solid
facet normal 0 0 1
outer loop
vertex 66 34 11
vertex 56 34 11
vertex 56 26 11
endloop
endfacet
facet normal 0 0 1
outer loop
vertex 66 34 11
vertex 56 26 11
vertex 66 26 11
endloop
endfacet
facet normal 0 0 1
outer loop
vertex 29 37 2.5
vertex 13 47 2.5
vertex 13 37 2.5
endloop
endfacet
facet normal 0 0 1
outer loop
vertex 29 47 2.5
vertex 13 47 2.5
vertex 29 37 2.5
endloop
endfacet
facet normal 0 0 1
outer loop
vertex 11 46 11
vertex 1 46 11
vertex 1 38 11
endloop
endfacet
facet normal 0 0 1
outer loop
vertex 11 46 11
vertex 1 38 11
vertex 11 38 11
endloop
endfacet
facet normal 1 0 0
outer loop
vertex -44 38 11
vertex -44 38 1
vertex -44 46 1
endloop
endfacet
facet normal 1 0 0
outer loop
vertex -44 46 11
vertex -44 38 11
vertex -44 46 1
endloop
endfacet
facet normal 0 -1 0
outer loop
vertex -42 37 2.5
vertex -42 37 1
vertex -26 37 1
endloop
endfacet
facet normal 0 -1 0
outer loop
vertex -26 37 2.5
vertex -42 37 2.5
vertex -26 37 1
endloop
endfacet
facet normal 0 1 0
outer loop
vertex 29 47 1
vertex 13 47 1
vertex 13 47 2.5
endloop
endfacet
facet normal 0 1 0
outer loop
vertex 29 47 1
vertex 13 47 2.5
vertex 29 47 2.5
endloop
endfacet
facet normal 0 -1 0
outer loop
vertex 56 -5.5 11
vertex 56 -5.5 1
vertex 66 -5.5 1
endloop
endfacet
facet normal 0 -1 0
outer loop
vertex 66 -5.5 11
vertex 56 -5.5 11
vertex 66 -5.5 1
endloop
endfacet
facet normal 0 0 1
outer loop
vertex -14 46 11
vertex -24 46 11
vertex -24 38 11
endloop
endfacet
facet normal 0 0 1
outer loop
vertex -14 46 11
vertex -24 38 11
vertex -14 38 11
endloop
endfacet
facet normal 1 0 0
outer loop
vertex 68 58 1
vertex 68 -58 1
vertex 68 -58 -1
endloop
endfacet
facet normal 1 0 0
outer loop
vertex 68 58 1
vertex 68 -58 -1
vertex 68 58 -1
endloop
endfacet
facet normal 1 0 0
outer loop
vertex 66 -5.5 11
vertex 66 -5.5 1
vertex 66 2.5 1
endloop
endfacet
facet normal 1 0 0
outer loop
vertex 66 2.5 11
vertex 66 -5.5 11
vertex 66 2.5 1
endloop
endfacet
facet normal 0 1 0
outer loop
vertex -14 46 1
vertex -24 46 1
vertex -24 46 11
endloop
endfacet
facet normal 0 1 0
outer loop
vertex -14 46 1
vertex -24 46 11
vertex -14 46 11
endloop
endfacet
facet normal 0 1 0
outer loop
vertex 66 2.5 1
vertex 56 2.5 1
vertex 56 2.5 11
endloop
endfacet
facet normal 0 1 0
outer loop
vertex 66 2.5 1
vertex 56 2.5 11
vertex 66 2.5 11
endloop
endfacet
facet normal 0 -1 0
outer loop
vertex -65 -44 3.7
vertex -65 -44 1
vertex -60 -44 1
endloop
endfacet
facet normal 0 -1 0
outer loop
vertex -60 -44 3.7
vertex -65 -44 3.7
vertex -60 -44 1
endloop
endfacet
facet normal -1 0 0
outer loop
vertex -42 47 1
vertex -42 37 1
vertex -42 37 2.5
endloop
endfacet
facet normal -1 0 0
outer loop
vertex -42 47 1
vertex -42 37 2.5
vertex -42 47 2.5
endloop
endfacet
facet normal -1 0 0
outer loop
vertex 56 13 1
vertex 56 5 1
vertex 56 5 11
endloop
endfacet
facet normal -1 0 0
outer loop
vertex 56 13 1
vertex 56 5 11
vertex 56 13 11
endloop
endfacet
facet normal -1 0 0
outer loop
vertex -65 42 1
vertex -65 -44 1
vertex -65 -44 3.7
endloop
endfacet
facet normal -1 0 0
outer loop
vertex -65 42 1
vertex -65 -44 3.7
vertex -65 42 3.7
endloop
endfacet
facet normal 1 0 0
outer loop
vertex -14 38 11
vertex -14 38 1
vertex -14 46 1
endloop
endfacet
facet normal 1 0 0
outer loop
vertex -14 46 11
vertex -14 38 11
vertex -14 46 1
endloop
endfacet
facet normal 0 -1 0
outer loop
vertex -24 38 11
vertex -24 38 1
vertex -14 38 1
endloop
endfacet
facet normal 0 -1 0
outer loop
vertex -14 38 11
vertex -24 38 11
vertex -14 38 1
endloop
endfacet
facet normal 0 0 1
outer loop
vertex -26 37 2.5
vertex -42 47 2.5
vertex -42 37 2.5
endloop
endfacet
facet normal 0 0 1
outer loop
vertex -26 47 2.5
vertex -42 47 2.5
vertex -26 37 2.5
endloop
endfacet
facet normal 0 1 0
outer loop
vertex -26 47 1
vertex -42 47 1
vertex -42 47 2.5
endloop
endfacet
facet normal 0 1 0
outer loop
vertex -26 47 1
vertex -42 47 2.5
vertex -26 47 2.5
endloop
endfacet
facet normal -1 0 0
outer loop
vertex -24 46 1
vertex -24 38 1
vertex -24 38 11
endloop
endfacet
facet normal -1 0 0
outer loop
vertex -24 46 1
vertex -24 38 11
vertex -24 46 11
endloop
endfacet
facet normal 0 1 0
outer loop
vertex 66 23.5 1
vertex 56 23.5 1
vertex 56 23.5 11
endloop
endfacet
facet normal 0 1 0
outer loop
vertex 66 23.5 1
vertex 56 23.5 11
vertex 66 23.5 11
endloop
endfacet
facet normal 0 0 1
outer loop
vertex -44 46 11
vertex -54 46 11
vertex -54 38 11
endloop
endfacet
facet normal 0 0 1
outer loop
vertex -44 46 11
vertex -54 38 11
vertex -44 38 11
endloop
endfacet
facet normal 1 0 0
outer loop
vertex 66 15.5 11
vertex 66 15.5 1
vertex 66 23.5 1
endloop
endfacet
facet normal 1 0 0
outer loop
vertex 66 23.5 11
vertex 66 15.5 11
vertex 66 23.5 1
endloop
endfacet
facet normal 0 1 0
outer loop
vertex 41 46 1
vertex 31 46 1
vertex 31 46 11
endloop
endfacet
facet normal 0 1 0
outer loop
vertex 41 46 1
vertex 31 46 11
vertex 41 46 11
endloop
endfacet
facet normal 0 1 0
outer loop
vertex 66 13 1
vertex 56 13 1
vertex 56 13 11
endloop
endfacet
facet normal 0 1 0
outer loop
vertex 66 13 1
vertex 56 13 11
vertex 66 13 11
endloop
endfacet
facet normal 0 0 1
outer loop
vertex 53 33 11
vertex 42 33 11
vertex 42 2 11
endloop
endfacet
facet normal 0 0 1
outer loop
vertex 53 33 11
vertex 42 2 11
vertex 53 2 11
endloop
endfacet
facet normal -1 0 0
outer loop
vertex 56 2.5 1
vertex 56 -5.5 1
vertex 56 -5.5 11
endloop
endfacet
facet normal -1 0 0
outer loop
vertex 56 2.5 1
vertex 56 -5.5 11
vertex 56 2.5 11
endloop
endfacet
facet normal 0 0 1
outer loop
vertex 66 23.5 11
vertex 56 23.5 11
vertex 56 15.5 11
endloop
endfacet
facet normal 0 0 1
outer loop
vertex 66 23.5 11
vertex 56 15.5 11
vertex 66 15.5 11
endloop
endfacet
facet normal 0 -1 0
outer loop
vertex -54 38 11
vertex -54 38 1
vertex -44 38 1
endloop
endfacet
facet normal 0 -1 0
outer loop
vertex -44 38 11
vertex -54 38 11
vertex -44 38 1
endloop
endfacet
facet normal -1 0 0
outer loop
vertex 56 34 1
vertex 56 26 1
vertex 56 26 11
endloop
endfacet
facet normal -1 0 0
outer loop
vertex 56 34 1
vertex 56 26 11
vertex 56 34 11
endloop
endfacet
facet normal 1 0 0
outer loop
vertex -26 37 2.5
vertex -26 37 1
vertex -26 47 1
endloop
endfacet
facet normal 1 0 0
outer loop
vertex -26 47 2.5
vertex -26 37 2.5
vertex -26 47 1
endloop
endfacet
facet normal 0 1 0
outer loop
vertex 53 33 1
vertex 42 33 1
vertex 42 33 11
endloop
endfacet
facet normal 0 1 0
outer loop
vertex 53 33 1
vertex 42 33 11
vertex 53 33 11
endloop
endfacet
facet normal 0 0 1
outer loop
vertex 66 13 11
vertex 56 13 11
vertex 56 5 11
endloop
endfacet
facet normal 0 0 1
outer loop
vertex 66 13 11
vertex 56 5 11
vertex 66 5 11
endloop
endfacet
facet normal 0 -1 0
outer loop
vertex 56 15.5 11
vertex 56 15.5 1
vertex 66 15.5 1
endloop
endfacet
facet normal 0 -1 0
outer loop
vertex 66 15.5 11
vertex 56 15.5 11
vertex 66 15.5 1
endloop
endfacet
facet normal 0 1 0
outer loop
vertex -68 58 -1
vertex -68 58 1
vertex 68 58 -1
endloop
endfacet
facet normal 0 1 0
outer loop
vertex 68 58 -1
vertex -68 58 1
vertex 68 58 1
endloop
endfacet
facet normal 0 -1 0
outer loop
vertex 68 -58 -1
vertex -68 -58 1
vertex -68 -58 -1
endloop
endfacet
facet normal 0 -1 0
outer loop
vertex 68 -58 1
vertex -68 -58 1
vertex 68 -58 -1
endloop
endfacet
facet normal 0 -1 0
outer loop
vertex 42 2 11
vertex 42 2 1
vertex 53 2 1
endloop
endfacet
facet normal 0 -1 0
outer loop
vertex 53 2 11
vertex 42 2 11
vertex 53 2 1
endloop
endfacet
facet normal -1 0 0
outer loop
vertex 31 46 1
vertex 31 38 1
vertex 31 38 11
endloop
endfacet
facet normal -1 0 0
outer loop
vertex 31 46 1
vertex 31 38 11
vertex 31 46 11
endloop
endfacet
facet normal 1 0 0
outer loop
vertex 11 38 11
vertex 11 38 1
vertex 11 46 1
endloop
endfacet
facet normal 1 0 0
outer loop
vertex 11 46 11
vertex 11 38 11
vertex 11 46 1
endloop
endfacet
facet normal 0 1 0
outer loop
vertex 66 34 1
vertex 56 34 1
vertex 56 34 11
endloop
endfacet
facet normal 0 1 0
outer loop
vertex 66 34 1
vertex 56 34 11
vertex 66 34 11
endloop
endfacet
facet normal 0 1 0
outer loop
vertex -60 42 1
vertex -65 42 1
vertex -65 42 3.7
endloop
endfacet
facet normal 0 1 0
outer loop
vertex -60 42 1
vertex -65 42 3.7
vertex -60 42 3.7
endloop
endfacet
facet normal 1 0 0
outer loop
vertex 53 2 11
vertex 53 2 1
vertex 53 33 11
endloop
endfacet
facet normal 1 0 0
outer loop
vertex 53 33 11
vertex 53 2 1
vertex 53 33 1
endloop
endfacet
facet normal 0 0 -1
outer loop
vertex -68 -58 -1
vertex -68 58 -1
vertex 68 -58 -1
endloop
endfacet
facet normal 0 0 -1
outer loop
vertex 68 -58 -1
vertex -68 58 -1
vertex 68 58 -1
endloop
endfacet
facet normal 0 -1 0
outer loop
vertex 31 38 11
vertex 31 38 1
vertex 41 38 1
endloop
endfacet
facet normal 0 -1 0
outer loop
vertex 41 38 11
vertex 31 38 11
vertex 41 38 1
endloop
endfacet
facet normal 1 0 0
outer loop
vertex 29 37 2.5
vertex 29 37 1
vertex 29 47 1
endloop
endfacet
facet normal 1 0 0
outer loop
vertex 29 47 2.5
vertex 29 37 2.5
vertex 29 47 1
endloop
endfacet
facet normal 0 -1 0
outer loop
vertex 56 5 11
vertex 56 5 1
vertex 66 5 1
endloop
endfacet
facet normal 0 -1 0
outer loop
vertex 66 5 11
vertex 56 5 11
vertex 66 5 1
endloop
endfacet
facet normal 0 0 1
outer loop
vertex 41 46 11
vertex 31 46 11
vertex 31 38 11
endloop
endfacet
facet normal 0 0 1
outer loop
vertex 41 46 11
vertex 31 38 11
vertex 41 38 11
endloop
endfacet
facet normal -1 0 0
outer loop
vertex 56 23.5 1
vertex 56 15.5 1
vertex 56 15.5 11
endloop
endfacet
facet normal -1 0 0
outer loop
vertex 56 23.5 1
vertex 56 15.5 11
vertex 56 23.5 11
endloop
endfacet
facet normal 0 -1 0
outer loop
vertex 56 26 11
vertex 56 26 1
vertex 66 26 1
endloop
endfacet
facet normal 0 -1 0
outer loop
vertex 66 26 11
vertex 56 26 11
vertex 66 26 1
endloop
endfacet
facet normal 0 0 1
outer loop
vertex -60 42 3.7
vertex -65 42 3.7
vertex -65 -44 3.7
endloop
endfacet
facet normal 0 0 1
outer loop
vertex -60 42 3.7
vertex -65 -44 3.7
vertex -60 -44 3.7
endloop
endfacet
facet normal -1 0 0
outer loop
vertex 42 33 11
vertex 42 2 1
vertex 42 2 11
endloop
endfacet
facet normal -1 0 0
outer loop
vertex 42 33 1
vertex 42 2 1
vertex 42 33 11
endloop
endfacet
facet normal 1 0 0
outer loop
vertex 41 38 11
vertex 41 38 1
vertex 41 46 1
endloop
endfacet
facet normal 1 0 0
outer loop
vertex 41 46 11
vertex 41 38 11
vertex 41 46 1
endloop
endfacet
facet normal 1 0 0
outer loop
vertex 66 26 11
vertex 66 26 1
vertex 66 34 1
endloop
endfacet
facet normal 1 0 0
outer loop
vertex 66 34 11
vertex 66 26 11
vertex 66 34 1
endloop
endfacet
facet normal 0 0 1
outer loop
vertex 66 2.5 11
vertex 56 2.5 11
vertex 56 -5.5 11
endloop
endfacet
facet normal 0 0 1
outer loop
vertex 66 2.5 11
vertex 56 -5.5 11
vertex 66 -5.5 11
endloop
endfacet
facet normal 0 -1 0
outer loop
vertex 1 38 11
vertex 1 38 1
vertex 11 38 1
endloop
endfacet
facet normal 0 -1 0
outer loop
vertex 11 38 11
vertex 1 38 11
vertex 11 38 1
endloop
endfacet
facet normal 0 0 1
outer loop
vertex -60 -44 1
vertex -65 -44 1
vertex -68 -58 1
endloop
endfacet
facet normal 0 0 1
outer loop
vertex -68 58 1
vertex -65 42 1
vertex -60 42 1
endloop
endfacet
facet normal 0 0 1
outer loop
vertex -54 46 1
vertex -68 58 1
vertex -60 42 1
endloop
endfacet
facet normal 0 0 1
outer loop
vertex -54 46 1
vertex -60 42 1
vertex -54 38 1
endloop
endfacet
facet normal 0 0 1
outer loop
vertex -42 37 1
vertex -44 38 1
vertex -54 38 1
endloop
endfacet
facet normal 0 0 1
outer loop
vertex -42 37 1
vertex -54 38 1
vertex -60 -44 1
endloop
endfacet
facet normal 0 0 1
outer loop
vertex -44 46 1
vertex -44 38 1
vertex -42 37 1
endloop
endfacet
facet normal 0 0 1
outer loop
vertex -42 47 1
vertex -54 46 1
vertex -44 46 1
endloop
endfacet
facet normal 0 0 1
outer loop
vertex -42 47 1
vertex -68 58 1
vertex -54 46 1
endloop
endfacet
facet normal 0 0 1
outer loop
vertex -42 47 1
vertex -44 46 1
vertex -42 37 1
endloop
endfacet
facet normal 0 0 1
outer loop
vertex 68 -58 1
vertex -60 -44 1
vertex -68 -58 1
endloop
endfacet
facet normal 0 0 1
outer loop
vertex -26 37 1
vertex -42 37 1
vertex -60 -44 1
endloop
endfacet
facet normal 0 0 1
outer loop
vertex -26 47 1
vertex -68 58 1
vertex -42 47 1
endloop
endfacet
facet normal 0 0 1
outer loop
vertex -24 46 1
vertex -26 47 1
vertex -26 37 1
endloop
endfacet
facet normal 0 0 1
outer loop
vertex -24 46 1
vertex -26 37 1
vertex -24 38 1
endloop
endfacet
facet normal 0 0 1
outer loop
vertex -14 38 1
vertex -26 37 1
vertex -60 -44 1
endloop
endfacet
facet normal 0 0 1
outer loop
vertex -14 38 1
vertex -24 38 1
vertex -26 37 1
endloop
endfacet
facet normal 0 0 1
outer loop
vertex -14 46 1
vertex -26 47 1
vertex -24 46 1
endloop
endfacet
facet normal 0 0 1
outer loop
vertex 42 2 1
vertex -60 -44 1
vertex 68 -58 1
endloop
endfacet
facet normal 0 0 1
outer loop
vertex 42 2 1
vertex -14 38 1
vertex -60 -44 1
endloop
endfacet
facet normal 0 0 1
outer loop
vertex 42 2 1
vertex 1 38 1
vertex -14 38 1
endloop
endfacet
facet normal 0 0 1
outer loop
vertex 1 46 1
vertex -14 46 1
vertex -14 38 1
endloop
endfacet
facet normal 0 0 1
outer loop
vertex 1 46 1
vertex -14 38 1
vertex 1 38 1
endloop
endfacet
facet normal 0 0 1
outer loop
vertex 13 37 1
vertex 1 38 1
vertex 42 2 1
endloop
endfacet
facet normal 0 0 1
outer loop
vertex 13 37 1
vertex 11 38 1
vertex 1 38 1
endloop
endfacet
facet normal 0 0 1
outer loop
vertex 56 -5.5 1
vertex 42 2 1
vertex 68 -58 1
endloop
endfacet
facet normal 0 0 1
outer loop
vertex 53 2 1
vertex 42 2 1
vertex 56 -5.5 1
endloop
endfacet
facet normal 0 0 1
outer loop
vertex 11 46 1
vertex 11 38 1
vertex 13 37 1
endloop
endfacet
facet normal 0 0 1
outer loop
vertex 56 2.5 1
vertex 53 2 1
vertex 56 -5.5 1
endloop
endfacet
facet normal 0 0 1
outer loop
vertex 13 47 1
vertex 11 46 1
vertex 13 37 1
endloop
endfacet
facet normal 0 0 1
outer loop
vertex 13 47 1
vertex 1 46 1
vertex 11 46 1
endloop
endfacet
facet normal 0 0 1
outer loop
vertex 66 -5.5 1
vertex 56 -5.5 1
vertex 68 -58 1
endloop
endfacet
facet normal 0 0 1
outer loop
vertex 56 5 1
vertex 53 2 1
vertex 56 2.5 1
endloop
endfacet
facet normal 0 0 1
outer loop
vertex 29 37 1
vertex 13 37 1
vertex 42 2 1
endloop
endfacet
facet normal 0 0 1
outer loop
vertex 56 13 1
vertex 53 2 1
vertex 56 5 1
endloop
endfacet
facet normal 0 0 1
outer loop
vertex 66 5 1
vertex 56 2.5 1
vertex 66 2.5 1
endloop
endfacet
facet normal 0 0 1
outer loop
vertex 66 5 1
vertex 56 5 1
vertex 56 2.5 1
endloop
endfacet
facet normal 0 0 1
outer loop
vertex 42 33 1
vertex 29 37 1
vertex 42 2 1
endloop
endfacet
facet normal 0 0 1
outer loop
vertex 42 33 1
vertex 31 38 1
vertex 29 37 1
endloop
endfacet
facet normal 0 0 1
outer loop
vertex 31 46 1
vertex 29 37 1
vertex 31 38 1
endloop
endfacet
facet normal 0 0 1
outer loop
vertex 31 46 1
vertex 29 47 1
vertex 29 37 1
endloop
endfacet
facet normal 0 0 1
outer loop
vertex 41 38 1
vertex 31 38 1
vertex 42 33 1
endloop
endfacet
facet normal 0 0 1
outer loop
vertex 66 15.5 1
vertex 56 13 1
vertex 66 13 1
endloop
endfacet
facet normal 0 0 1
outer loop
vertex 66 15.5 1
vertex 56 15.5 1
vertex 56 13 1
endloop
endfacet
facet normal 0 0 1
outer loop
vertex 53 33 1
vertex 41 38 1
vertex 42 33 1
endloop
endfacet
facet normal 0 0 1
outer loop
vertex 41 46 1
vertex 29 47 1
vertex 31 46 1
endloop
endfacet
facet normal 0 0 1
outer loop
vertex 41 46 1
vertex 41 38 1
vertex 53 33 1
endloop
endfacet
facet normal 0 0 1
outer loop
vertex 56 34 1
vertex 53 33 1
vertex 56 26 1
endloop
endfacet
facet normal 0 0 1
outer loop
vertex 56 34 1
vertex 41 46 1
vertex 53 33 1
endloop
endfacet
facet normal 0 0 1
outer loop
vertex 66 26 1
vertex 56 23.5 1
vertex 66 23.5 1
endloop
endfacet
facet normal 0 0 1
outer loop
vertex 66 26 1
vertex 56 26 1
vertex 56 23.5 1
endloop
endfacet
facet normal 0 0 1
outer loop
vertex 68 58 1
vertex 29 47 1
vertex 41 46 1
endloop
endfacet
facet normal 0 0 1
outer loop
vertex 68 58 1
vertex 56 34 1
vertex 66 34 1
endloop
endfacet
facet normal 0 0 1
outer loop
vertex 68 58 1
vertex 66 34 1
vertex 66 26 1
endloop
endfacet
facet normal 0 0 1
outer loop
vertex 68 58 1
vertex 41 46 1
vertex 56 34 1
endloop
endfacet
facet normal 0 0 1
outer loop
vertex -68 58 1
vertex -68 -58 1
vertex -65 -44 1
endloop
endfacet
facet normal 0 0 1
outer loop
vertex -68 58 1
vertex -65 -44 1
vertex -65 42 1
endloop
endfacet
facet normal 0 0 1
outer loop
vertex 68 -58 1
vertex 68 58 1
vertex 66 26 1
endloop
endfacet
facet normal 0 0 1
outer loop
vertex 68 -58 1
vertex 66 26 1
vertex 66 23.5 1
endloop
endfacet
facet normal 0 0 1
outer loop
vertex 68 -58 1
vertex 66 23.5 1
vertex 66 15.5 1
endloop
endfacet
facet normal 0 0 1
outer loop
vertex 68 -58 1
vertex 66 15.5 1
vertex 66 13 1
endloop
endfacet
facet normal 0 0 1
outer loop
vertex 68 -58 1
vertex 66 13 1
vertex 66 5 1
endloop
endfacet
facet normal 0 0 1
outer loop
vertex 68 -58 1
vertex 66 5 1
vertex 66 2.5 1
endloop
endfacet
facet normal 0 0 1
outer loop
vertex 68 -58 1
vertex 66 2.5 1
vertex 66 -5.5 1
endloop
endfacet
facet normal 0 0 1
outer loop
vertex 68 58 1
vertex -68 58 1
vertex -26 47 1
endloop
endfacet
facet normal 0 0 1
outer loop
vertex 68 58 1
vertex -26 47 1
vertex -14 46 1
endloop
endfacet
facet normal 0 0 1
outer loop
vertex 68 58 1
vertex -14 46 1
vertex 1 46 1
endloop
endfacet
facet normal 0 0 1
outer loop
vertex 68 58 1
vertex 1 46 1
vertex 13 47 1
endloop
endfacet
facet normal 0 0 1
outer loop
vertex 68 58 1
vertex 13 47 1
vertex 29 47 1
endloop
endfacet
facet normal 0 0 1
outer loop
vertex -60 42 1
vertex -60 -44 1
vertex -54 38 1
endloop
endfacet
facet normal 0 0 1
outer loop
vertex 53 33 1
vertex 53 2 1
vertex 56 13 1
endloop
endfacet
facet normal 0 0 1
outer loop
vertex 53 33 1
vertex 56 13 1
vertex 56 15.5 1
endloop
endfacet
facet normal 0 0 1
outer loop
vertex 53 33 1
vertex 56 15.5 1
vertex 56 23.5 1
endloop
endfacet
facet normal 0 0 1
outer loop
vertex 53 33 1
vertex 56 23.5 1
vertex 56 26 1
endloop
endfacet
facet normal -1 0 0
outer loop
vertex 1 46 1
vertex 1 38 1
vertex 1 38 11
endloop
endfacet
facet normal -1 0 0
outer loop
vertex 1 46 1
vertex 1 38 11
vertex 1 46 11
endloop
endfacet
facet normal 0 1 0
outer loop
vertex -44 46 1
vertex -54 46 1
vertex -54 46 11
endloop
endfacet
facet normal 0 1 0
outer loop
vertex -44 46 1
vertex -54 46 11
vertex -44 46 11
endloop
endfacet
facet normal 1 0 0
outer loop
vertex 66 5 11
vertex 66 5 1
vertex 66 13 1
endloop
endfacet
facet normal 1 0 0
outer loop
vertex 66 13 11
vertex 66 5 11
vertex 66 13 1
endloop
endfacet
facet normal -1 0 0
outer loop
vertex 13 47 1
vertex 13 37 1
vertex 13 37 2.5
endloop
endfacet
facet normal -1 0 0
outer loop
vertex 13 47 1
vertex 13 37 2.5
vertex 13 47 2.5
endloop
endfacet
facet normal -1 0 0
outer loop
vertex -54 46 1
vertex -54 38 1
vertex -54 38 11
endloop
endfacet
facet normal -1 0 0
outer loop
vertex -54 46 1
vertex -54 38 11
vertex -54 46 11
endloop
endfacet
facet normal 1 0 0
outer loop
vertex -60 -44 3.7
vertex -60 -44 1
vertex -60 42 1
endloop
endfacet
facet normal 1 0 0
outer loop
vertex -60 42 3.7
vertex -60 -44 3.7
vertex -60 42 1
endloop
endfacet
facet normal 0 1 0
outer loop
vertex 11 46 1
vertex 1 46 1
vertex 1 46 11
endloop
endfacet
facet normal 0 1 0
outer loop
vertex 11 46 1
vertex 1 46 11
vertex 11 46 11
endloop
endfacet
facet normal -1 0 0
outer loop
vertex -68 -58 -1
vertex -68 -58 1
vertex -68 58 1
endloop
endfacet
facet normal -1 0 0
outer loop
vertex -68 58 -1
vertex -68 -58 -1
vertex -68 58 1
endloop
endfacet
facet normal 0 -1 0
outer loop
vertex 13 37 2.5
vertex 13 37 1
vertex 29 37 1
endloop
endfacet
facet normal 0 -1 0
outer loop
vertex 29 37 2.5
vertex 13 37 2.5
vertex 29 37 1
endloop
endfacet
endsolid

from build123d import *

# Parameters (mm, degrees)
F0_W        = 136
F0_H        = 116
F1_DEPTH    = 1
F2_W        = 11
F2_H        = 31
F2_W_2      = 16
F2_H_2      = 10
F2_W_3      = 5
F2_H_3      = 86
F2_W_4      = 10
F2_H_4      = 8
F3_DEPTH    = 10
F3_FACE_W   = 5
F3_FACE_H   = 86
F4_DEPTH    = 7.3
F3_FACE_W_2 = 16
F3_FACE_H_2 = 10
F5_DEPTH    = 8.5


with BuildPart() as f1:
    # F0 (on Top) → F1 (new body, symmetric)
    with BuildSketch(Plane.XY):
        Rectangle(F0_W, F0_H)
    extrude(amount=F1_DEPTH, both=True)

    # F2 (on face) → F3 (join)
    with BuildSketch(Plane.XY.offset(1)):
        with Locations((47.5, 17.5)):
            Rectangle(F2_W, F2_H)
        with Locations((21, 42)):
            Rectangle(F2_W_2, F2_H_2)
        with Locations((-34, 42)):
            Rectangle(F2_W_2, F2_H_2)
        with Locations((-62.5, -1)):
            Rectangle(F2_W_3, F2_H_3)
        with Locations((-49, 42)):
            Rectangle(F2_W_4, F2_H_4)
        with Locations((-19, 42)):
            Rectangle(F2_W_4, F2_H_4)
        with Locations((6, 42)):
            Rectangle(F2_W_4, F2_H_4)
        with Locations((36, 42)):
            Rectangle(F2_W_4, F2_H_4)
        with Locations((61, 30)):
            Rectangle(F2_W_4, F2_H_4)
        with Locations((61, 19.5)):
            Rectangle(F2_W_4, F2_H_4)
        with Locations((61, 9)):
            Rectangle(F2_W_4, F2_H_4)
        with Locations((61, -1.5)):
            Rectangle(F2_W_4, F2_H_4)
    extrude(amount=F3_DEPTH)

    # F3_face (on face) → F4 (cut)
    with BuildSketch(Plane(origin=(-62.5, -1, 11), x_dir=(1, 0, 0), z_dir=(0, 0, 1))):
        Rectangle(F3_FACE_W, F3_FACE_H)
    extrude(amount=-F4_DEPTH, mode=Mode.SUBTRACT)

    # F3_face (on face) → F5 (cut)
    with BuildSketch(Plane(origin=(-62.5, -1, 11), x_dir=(1, 0, 0), z_dir=(0, 0, 1))):
        with Locations((28.5, 43)):
            Rectangle(F3_FACE_W_2, F3_FACE_H_2)
        with Locations((83.5, 43)):
            Rectangle(F3_FACE_W_2, F3_FACE_H_2)
    extrude(amount=-F5_DEPTH, mode=Mode.SUBTRACT)


solid = f1.part
